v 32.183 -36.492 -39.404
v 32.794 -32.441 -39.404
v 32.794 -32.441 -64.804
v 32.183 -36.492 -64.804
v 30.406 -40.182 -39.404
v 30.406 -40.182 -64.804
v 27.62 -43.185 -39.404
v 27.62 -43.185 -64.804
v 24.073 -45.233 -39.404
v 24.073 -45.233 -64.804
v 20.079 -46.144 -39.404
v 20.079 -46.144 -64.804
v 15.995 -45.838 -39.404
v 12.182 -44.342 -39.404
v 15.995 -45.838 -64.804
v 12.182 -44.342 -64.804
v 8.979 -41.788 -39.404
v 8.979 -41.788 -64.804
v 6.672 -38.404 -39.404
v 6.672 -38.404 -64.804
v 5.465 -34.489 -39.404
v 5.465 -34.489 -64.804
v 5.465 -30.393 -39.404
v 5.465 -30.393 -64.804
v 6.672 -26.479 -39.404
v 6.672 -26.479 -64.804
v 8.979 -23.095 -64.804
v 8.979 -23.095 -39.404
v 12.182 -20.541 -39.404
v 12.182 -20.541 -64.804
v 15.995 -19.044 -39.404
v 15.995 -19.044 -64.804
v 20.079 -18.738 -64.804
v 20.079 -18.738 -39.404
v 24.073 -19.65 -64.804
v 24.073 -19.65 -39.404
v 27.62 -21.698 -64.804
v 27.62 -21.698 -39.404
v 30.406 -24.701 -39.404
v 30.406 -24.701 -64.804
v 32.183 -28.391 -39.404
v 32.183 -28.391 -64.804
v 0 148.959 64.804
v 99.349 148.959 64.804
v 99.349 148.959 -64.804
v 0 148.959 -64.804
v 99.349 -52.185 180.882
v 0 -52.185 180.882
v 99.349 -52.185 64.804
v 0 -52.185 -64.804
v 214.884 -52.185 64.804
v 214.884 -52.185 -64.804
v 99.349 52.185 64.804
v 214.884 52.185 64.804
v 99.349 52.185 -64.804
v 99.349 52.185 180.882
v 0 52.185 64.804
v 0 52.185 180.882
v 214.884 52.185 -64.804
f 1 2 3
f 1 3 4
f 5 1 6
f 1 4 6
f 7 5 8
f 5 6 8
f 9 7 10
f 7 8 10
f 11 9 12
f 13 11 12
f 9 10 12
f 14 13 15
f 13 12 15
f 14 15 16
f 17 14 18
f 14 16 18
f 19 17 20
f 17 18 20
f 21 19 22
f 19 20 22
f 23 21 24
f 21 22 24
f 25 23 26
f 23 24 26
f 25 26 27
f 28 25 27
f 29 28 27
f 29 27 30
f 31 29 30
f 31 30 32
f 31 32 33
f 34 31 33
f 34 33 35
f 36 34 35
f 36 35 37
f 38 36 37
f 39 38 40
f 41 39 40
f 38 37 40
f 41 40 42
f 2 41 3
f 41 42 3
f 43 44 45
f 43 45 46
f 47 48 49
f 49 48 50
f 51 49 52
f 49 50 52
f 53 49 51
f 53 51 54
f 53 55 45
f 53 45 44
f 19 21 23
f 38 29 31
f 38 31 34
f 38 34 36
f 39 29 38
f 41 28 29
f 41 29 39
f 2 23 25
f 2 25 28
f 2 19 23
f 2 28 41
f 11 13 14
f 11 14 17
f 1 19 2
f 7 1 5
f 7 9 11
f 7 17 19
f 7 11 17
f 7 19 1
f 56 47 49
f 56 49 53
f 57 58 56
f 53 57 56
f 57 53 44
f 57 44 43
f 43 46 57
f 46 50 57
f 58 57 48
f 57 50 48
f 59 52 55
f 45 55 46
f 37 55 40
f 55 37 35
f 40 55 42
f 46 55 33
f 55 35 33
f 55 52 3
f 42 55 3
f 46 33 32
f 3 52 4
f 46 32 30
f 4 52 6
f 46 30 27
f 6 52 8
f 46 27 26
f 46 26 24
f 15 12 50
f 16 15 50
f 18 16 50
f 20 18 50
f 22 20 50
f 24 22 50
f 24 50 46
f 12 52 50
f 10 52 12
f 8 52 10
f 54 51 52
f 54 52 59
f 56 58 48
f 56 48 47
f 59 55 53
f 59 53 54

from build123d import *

# Parameters (mm, degrees)
F0_W     = 104.369306
F0_H     = 129.608706
F1_DEPTH = 214.884
F2_W     = 99.349372
F2_H     = 104.369306
F3_DEPTH = 116.078
F4_W     = 99.349372
F4_H     = 129.608706
F5_DEPTH = 96.774
F6_R     = 13.7414
F7_DEPTH = 25.4


with BuildPart() as f1:
    # F0 (on Right) → F1 (new body)
    with BuildSketch(Plane.YZ):
        Rectangle(F0_W, F0_H)
    extrude(amount=F1_DEPTH)

    # F2 (on face) → F3 (join)
    with BuildSketch(Plane.XY.offset(64.804353)):
        with Locations((49.674686, 0)):
            Rectangle(F2_W, F2_H)
    extrude(amount=F3_DEPTH)

    # F4 (on face) → F5 (join)
    with BuildSketch(Plane(origin=(0, 52.184653, 0), x_dir=(-1, 0, 0), z_dir=(0, 1, 0))):
        with Locations((-49.674686, 0)):
            Rectangle(F4_W, F4_H)
    extrude(amount=F5_DEPTH)

    # F6 (on face) → F7 (cut)
    with BuildSketch(Plane(origin=(0, 0, -64.804353), x_dir=(1, 0, 0), z_dir=(0, 0, -1))):
        with Locations((19.05245, 32.441348)):
            Circle(F6_R)
    extrude(amount=-F7_DEPTH, mode=Mode.SUBTRACT)


solid = f1.part
